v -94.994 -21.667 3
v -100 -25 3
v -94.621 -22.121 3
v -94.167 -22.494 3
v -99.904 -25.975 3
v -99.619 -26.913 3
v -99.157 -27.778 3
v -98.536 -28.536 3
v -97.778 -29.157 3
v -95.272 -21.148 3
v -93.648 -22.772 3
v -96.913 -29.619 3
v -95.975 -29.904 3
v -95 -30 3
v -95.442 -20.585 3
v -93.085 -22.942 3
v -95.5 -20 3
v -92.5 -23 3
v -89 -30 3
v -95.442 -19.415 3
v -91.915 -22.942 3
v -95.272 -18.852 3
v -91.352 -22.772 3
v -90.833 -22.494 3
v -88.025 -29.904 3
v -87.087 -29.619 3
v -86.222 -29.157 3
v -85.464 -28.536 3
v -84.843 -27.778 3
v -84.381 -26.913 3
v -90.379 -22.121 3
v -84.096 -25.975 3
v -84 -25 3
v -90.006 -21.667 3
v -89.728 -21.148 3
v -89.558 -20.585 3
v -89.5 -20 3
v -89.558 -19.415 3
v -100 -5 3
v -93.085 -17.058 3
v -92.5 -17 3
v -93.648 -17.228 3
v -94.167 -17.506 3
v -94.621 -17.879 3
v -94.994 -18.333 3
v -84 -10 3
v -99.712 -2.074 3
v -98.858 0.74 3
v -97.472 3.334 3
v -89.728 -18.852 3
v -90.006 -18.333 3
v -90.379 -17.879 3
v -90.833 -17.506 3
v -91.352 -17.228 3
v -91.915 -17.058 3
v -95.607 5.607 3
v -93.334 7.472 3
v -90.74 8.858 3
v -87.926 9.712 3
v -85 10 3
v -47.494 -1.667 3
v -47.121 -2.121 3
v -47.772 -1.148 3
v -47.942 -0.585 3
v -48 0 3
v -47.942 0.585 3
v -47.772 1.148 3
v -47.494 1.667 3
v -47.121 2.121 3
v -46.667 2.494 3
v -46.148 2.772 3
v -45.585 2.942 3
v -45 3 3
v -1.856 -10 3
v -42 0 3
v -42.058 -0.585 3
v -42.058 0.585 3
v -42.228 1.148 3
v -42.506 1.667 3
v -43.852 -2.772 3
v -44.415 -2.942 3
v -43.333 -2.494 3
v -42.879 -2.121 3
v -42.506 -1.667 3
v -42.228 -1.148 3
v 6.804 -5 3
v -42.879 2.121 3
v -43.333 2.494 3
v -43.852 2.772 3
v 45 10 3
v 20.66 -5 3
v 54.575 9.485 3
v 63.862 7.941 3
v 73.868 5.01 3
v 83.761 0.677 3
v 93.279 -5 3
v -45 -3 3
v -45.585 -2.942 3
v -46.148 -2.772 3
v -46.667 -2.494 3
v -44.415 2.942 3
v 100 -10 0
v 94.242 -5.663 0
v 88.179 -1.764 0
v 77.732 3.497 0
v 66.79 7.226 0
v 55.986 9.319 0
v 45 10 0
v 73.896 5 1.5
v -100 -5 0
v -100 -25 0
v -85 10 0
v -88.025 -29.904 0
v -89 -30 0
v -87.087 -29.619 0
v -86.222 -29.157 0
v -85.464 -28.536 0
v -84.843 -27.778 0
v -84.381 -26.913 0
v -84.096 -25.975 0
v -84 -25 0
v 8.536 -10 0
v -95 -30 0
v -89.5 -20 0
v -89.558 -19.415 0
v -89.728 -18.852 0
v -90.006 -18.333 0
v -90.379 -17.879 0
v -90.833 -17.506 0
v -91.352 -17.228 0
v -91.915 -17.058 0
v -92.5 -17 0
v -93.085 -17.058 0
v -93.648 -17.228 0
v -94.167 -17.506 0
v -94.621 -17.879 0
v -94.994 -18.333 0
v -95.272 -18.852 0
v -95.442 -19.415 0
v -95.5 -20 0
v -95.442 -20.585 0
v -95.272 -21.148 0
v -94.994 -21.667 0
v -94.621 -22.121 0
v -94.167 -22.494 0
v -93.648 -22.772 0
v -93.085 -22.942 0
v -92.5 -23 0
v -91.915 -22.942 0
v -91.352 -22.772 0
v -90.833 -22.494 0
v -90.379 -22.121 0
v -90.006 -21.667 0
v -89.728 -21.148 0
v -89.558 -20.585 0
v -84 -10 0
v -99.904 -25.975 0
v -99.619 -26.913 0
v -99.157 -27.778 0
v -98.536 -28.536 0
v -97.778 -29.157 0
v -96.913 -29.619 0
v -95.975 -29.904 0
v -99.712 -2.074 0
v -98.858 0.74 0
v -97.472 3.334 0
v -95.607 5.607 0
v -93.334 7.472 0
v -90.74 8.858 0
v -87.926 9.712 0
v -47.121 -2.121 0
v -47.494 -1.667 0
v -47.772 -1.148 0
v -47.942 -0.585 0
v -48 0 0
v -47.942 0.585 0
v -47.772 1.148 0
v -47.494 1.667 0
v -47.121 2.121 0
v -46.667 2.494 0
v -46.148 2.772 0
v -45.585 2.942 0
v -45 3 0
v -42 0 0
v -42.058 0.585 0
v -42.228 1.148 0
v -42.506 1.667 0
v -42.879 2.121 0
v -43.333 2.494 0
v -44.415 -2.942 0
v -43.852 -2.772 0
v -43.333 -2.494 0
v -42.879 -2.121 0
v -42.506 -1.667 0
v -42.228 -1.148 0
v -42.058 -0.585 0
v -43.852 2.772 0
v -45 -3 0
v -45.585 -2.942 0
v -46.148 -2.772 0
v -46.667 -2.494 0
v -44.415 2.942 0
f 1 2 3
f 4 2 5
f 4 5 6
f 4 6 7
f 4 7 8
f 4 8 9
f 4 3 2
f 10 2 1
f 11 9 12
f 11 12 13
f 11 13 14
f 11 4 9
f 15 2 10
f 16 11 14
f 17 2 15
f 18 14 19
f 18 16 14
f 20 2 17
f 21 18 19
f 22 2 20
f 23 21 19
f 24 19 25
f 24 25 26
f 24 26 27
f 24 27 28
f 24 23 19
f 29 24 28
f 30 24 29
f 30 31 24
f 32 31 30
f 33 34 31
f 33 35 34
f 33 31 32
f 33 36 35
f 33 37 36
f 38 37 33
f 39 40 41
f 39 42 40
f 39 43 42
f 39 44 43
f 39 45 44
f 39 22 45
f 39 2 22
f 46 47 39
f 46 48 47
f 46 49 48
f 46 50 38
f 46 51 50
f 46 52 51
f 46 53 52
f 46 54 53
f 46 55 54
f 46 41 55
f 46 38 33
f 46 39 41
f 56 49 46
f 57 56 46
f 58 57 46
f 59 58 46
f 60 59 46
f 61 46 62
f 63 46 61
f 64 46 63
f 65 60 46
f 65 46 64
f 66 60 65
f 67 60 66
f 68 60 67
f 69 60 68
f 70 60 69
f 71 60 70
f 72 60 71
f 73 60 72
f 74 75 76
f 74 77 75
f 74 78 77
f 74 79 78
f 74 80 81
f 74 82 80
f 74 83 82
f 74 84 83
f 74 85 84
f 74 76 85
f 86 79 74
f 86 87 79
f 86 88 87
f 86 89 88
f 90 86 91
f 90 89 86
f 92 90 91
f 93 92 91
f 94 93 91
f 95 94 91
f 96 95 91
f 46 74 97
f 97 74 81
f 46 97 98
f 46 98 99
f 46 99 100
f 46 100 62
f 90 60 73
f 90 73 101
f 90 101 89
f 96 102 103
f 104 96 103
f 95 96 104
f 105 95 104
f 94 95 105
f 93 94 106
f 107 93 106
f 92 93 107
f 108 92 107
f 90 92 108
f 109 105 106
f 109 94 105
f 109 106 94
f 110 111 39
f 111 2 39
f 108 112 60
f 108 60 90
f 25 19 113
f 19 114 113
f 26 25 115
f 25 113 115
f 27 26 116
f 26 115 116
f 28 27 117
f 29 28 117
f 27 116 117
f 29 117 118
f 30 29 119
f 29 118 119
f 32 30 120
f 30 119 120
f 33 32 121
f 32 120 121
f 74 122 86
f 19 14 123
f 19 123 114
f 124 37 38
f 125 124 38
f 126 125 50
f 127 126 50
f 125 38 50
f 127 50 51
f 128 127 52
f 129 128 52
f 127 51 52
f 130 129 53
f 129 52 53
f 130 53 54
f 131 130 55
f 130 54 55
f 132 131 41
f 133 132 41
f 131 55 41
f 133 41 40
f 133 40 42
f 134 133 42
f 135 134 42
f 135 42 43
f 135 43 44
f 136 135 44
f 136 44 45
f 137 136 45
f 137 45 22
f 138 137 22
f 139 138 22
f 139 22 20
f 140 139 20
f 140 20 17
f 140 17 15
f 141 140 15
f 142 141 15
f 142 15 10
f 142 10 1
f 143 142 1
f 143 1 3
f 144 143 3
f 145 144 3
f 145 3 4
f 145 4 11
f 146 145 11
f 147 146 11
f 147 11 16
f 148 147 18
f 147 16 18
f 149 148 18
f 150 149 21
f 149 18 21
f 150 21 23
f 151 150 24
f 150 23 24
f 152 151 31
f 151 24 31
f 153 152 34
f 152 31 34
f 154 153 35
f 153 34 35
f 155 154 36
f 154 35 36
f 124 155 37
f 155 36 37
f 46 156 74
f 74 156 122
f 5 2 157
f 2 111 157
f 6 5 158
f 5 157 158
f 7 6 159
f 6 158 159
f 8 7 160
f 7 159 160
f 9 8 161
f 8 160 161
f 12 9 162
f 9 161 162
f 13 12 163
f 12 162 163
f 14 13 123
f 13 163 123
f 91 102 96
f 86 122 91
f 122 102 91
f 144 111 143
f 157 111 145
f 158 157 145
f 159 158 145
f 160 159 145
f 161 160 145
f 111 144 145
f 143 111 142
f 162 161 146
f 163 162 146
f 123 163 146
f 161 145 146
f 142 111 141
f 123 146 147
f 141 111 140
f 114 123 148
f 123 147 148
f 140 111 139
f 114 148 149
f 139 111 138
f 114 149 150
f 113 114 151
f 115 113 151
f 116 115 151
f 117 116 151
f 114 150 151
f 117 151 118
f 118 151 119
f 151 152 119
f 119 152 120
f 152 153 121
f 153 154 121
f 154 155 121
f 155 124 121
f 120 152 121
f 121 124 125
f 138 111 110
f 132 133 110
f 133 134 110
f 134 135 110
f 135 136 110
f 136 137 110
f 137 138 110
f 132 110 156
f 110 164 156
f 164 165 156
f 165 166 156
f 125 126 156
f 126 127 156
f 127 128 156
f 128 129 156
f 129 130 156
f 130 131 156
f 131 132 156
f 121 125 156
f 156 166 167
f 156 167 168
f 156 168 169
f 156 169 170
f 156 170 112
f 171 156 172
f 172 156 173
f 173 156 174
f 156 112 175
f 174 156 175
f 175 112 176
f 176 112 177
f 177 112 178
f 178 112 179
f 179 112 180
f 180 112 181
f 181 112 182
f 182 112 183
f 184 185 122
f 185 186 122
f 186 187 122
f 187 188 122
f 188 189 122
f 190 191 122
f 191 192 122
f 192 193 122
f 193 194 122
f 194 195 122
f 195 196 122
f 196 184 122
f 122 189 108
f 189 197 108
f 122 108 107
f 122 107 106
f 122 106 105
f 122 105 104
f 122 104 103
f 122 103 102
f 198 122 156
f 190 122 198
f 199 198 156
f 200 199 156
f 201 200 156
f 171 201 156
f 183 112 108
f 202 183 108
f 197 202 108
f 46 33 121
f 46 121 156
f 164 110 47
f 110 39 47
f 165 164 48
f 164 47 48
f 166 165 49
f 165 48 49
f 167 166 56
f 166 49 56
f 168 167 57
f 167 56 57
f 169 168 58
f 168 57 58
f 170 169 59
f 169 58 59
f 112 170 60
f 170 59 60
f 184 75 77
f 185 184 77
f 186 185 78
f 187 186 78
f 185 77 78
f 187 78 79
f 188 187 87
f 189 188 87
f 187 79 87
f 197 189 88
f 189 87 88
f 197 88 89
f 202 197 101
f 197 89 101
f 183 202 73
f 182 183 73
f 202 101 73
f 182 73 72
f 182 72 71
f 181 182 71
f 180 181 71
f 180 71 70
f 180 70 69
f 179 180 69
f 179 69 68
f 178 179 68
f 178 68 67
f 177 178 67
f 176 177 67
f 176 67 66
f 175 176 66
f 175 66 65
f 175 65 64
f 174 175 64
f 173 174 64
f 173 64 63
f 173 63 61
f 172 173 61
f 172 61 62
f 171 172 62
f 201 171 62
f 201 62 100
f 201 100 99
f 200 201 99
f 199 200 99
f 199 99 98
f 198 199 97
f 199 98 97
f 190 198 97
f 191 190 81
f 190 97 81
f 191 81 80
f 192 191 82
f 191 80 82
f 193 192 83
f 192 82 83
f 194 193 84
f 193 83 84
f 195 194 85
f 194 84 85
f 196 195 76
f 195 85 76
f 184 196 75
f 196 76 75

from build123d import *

# Parameters (mm, degrees)
SKETCH_1_W          = 200
SKETCH_1_H          = 20
EXTRUDE_1_DEPTH     = 3
CUT_EXTRUDE_1_REACH = 202.272
CHAMFER_1_SIZE      = 4
CHAMFER_1_SIZE_2    = 6.92820323
CUT_EXTRUDE_2_DEPTH = 101.543522914
SKETCH_5_R          = 3
CUT_EXTRUDE_3_DEPTH = 4
SKETCH_8_W          = 16
SKETCH_8_H          = 20
EXTRUDE_2_DEPTH     = 3
SKETCH_7_R          = 3
CUT_EXTRUDE_5_DEPTH = 10
FILLET_1_R          = 15
FILLET_2_R          = 5


with BuildPart() as part:
    # 草图1 → 凸台-拉伸1 (new body)
    with BuildSketch(Plane.XY):
        Rectangle(SKETCH_1_W, SKETCH_1_H)
    extrude(amount=EXTRUDE_1_DEPTH)

    # 切除-拉伸1: up to this plane
    cut_extrude_1_end = Plane(origin=(7.330127019, -12.696152423, 0), z_dir=(-0.49999999999999445, 0.8660254037844419, 0))
    # 草图3 → 切除-拉伸1 (cut, up to the surface)
    with BuildSketch(Plane(origin=(100, 0, 0), x_dir=(0, 0, -1), z_dir=(1, 0, 0)), mode=Mode.PRIVATE) as cut_extrude_1_sk1:
        Polygon((-3, -5), (0, -10), (-3, -10), align=None)
    cut_extrude_1_tool1 = split(extrude(cut_extrude_1_sk1.sketch, amount=-CUT_EXTRUDE_1_REACH, mode=Mode.PRIVATE), bisect_by=cut_extrude_1_end, keep=Keep.BOTH, mode=Mode.PRIVATE)
    add(cut_extrude_1_tool1.solids().sort_by_distance((100, -8.333333, 2))[0], mode=Mode.SUBTRACT)

    # 倒角1
    # the kernel refuses this chamfer: 6.92820323, 4 mm, written as the material it takes off along each edge
    with BuildSketch(Plane(origin=(-3.522514528, -18.961927941, 3), x_dir=(0.02894693120133512, -0.05013755556391397, -0.9983227437537926), z_dir=(0.8660254037844419, 0.49999999999999445, 0))) as chamfer_1_piece_1_section:
        Polygon((CHAMFER_1_SIZE * 0.998322743754, CHAMFER_1_SIZE * 0.0578938624027), (-CHAMFER_1_SIZE_2 * 0.057893862405, CHAMFER_1_SIZE_2 * 0.998322743793), (0, 0), align=None)
    chamfer_1_piece_1 = extrude(amount=45.847711765, mode=Mode.PRIVATE)
    chamfer_1_piece_1 = split(chamfer_1_piece_1, bisect_by=Plane(origin=(9.642486401, -7.716503268, 1.370098039), z_dir=(0, -0.5144957554275265, 0.8574929257125443)), keep=Keep.TOP, mode=Mode.PRIVATE)
    add(chamfer_1_piece_1, mode=Mode.SUBTRACT)

    # 草图4 → 切除-拉伸2 (cut, through all)
    with BuildSketch(Plane.XY.offset(3)):
        with BuildLine():
            Line((45, 10), (45, 14.118329336))
            Line((45, 14.118329336), (100, 14.118329336))
            Line((100, 14.118329336), (100, -10))
            add(Edge.make_bspline(
                [(100, -10), (75.292472647, 10), (45, 10)],
                knots=[0, 0, 0, 1, 1, 1], degree=2))
        make_face()
    extrude(amount=-CUT_EXTRUDE_2_DEPTH, mode=Mode.SUBTRACT)

    # 草图5 → 切除-拉伸3 (cut)
    with BuildSketch(Plane.XY.offset(3)):
        with Locations((-45, 0)):
            Circle(SKETCH_5_R)
    extrude(amount=-CUT_EXTRUDE_3_DEPTH, mode=Mode.SUBTRACT)

    # 草图8 → 凸台-拉伸2 (add)
    with BuildSketch(Plane.XY.offset(3)):
        with Locations((-92, -20)):
            Rectangle(SKETCH_8_W, SKETCH_8_H)
    extrude(amount=-EXTRUDE_2_DEPTH)

    # 草图7 → 切除-拉伸5 (cut)
    with BuildSketch(Plane.XY.offset(3)):
        with Locations((-92.5, -20)):
            Circle(SKETCH_7_R)
    extrude(amount=-CUT_EXTRUDE_5_DEPTH, mode=Mode.SUBTRACT)

    # 圆角1
    fillet_1_edges = [part.edges().sort_by_distance(p)[0] for p in [
        (-100, 10, 1.5),
    ]]
    fillet(fillet_1_edges, radius=FILLET_1_R)

    # 圆角2
    fillet_2_edges = [part.edges().sort_by_distance(p)[0] for p in [
        (-84, -30, 1.5),
        (-100, -30, 1.5),
    ]]
    fillet(fillet_2_edges, radius=FILLET_2_R)


solid = part.part
